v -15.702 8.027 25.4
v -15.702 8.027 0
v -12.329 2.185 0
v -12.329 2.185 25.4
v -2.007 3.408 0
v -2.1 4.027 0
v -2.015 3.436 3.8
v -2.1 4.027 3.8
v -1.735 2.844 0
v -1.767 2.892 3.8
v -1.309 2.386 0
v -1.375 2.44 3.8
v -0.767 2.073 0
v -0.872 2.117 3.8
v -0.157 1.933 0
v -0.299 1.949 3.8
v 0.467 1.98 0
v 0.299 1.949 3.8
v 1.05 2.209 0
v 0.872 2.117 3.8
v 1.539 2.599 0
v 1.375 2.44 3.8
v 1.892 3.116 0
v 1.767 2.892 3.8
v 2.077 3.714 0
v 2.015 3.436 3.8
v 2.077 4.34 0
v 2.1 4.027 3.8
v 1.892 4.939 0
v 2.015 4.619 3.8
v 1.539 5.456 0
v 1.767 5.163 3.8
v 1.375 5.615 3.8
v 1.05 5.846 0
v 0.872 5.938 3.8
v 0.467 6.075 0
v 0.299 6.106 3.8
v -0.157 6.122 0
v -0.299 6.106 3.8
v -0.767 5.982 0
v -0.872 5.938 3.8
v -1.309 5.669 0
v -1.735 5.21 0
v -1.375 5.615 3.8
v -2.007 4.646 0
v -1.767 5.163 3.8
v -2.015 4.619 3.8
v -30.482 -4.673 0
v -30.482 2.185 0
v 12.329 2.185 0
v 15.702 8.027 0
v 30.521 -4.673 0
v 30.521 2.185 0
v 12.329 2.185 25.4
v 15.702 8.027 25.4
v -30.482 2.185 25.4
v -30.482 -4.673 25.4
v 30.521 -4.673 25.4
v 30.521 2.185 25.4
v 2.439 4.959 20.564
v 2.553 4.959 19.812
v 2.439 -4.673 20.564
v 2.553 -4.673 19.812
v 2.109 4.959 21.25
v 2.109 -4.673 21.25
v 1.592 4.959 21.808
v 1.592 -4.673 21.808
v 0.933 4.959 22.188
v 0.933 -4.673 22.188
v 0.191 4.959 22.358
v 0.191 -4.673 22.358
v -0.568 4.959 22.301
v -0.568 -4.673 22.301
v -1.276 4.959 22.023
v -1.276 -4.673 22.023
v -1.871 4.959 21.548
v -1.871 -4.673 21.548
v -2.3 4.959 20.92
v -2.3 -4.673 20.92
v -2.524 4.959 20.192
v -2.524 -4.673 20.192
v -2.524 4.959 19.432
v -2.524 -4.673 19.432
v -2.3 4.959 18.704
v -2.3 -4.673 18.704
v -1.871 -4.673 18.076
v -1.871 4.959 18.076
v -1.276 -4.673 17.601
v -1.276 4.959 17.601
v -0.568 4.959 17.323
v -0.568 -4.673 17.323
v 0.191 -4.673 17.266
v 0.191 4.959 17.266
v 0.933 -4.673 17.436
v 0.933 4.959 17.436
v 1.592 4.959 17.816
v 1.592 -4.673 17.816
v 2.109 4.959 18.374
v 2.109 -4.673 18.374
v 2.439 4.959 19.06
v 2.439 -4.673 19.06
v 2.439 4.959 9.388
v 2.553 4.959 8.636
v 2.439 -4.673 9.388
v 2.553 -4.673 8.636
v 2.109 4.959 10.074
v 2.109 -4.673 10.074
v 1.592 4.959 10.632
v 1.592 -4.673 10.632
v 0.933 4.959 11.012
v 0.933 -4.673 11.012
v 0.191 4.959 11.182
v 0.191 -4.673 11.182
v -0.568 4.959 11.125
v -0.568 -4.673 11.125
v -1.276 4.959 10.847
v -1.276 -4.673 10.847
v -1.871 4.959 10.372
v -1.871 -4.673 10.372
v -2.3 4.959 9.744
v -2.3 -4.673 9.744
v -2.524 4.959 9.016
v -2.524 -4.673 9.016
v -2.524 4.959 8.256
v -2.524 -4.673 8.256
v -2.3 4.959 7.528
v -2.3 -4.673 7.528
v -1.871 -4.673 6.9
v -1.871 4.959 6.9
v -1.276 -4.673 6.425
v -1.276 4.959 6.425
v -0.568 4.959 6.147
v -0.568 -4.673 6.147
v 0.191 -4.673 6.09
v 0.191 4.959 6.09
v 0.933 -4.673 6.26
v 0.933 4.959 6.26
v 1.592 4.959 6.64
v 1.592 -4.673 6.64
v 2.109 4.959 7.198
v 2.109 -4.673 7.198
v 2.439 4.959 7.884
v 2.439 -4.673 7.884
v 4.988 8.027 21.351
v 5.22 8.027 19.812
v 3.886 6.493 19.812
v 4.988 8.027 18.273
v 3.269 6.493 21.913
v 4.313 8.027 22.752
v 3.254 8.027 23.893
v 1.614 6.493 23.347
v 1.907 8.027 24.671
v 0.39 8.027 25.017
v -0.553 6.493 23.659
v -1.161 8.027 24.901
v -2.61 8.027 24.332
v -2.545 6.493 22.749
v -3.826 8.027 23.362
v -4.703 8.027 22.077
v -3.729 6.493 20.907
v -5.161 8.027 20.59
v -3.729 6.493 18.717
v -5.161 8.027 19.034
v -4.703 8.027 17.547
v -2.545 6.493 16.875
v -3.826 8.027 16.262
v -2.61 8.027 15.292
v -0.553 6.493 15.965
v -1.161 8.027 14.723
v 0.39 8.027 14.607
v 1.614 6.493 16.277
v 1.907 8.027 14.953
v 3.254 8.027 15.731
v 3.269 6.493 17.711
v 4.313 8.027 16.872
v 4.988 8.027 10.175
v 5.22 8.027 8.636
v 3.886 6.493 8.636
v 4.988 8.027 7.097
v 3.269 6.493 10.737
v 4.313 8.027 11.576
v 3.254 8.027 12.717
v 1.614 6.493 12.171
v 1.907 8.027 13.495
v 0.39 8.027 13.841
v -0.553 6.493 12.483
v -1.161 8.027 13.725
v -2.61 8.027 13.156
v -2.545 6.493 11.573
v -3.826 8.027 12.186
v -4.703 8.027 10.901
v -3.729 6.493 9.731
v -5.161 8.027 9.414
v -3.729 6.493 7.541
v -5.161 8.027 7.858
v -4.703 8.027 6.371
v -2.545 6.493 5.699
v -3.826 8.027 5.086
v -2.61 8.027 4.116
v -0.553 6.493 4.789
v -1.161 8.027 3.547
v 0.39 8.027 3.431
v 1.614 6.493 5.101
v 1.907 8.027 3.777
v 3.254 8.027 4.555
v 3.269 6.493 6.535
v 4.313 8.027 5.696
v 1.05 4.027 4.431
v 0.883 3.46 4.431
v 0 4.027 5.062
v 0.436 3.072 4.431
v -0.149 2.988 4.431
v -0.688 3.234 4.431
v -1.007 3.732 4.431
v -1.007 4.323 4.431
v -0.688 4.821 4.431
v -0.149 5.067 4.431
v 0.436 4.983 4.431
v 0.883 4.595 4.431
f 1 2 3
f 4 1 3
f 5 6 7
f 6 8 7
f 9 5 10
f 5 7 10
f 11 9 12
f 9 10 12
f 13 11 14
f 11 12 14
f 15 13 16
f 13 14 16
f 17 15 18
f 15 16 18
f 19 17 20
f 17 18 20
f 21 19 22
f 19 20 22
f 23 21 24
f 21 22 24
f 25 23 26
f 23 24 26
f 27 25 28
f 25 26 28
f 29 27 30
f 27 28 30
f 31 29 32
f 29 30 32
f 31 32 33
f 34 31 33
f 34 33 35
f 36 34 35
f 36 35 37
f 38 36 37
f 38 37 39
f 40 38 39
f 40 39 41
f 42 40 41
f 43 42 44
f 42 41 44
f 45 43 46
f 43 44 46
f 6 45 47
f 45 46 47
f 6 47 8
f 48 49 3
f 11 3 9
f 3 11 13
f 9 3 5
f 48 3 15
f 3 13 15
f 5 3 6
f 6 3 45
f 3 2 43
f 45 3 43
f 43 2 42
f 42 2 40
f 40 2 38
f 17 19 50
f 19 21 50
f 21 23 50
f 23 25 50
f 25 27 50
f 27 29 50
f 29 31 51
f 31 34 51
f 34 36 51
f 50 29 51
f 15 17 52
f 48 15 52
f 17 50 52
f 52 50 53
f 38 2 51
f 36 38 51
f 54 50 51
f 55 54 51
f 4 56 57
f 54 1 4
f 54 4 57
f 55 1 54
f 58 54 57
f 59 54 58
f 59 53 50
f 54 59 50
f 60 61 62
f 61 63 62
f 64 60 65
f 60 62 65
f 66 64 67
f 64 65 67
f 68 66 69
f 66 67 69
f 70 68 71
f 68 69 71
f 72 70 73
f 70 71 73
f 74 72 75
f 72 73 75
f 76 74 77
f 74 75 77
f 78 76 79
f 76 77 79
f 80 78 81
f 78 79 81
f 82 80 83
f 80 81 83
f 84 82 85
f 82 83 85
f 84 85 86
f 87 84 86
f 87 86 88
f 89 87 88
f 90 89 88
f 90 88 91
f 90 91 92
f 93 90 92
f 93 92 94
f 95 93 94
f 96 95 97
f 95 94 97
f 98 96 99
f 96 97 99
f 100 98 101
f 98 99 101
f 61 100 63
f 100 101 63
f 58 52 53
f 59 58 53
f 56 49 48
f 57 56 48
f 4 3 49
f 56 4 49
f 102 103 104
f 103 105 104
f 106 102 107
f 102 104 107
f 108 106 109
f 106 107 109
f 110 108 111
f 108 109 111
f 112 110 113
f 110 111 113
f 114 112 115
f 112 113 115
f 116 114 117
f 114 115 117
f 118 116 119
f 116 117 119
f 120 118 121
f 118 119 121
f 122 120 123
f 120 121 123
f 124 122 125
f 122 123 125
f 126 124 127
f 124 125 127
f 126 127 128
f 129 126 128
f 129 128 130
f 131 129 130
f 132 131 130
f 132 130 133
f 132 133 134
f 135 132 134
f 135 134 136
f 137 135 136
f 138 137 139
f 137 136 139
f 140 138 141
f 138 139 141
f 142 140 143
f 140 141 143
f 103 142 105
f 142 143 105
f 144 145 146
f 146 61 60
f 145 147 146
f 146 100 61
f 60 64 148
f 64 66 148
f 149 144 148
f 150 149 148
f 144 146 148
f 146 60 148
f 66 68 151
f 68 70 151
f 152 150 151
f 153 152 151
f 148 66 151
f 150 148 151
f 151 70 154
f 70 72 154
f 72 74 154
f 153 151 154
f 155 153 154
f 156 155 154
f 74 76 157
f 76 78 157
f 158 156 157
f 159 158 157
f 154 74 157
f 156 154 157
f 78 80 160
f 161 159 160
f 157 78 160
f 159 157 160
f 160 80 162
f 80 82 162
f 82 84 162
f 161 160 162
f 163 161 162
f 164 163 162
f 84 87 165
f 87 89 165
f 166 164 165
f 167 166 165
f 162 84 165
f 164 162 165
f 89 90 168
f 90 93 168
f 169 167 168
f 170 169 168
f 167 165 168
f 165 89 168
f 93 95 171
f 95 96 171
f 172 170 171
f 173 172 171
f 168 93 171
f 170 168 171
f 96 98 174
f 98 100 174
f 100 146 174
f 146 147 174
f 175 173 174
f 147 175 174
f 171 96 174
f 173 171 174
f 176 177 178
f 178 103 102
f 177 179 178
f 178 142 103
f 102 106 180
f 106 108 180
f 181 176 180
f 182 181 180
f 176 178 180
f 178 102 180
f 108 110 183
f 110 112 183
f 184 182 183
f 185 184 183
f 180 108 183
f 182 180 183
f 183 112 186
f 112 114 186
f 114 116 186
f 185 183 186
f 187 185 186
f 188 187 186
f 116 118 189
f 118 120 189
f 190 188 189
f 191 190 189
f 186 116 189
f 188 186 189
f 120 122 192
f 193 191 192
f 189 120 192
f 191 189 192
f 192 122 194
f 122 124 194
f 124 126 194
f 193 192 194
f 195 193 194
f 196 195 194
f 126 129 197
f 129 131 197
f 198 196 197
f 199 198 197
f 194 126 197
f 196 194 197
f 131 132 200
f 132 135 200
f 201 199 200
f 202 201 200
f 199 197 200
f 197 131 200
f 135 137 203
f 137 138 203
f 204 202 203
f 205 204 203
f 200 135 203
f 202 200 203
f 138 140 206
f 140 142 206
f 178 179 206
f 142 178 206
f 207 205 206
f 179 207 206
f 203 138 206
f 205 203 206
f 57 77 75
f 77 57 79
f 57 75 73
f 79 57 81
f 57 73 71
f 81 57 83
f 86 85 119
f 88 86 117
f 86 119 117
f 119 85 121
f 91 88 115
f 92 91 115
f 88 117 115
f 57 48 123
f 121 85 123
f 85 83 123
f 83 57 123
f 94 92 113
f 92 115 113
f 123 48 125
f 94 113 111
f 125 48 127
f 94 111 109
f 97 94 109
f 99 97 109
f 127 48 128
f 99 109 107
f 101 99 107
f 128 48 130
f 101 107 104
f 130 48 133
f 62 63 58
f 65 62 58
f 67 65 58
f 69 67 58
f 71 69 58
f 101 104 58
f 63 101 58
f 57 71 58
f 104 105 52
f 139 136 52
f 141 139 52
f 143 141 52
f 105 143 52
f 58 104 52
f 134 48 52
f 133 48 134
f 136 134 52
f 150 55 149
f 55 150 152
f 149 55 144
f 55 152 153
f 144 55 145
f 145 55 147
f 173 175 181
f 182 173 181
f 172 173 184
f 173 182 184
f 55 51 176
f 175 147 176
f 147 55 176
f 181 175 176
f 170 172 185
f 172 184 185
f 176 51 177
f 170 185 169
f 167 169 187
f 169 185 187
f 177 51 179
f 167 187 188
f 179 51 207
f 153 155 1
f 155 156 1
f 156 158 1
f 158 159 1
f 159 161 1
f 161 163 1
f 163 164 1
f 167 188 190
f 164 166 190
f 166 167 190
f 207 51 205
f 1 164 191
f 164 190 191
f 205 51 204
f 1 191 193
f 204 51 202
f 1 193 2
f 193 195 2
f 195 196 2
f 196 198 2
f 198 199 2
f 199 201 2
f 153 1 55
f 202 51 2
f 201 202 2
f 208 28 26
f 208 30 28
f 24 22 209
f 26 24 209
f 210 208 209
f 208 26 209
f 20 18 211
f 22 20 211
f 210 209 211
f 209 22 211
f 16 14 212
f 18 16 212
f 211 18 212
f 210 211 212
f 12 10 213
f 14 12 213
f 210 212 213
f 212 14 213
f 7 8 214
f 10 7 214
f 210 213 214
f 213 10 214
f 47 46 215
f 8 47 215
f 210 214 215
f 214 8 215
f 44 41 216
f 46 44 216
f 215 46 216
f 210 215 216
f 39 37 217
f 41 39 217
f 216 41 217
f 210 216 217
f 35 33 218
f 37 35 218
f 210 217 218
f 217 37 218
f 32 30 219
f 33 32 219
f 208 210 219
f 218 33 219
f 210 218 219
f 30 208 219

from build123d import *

# Parameters (mm, degrees)
F1_DEPTH       = 25.4
F3_D           = 4.2
F3_DEPTH       = 3.8
F3_TIP         = 1.2618073
F5_D           = 5.1054
F5_CSINK_D     = 10.4394
F5_CSINK_ANGLE = 82
F6_D           = 5.1054
F6_CSINK_D     = 10.4394
F6_CSINK_ANGLE = 82


with BuildPart() as f1:
    # F0 (on Top) → F1 (new body)
    with BuildSketch(Plane.XY):
        Polygon((15.702072531, 8.0274641514), (0, 8.0274641514), (-15.702072531, 8.0274641514), (-12.3291922584, 2.1854641514), (0, 2.1854641514), (12.3291922584, 2.1854641514), align=None)
        Polygon((0, 2.1854641514), (-12.3291922584, 2.1854641514), (-30.4818786681, 2.1854641514), (-30.4818786681, -4.6725358486), (30.5205043405, -4.6725358486), (30.5205043405, 2.1854641514), (30.4818786681, 2.1854641514), (12.3291922584, 2.1854641514), align=None)
    extrude(amount=F1_DEPTH)

    # F3
    with Locations(Plane(origin=(0, 0, 0), x_dir=(1, 0, 0), z_dir=(0, 0, -1))):
        with Locations((0, -4.0274641514)):
            Hole(F3_D / 2, depth=F3_DEPTH)
            with Locations((0, 0, -(F3_DEPTH + F3_TIP / 2))):  # 118° drill point
                Cone(0, F3_D / 2, F3_TIP, mode=Mode.SUBTRACT)

    # F5 (through all)
    with Locations(Plane(origin=(0, 8.0274641514, 0), x_dir=(-1, 0, 0), z_dir=(0, 1, 0))):
        with Locations((0, 19.812)):
            CounterSinkHole(F5_D / 2, F5_CSINK_D / 2, counter_sink_angle=F5_CSINK_ANGLE)

    # F6 (through all)
    with Locations(Plane(origin=(0, 8.0274641514, 0), x_dir=(-1, 0, 0), z_dir=(0, 1, 0))):
        with Locations((0, 8.636)):
            CounterSinkHole(F6_D / 2, F6_CSINK_D / 2, counter_sink_angle=F6_CSINK_ANGLE)


solid = f1.part
